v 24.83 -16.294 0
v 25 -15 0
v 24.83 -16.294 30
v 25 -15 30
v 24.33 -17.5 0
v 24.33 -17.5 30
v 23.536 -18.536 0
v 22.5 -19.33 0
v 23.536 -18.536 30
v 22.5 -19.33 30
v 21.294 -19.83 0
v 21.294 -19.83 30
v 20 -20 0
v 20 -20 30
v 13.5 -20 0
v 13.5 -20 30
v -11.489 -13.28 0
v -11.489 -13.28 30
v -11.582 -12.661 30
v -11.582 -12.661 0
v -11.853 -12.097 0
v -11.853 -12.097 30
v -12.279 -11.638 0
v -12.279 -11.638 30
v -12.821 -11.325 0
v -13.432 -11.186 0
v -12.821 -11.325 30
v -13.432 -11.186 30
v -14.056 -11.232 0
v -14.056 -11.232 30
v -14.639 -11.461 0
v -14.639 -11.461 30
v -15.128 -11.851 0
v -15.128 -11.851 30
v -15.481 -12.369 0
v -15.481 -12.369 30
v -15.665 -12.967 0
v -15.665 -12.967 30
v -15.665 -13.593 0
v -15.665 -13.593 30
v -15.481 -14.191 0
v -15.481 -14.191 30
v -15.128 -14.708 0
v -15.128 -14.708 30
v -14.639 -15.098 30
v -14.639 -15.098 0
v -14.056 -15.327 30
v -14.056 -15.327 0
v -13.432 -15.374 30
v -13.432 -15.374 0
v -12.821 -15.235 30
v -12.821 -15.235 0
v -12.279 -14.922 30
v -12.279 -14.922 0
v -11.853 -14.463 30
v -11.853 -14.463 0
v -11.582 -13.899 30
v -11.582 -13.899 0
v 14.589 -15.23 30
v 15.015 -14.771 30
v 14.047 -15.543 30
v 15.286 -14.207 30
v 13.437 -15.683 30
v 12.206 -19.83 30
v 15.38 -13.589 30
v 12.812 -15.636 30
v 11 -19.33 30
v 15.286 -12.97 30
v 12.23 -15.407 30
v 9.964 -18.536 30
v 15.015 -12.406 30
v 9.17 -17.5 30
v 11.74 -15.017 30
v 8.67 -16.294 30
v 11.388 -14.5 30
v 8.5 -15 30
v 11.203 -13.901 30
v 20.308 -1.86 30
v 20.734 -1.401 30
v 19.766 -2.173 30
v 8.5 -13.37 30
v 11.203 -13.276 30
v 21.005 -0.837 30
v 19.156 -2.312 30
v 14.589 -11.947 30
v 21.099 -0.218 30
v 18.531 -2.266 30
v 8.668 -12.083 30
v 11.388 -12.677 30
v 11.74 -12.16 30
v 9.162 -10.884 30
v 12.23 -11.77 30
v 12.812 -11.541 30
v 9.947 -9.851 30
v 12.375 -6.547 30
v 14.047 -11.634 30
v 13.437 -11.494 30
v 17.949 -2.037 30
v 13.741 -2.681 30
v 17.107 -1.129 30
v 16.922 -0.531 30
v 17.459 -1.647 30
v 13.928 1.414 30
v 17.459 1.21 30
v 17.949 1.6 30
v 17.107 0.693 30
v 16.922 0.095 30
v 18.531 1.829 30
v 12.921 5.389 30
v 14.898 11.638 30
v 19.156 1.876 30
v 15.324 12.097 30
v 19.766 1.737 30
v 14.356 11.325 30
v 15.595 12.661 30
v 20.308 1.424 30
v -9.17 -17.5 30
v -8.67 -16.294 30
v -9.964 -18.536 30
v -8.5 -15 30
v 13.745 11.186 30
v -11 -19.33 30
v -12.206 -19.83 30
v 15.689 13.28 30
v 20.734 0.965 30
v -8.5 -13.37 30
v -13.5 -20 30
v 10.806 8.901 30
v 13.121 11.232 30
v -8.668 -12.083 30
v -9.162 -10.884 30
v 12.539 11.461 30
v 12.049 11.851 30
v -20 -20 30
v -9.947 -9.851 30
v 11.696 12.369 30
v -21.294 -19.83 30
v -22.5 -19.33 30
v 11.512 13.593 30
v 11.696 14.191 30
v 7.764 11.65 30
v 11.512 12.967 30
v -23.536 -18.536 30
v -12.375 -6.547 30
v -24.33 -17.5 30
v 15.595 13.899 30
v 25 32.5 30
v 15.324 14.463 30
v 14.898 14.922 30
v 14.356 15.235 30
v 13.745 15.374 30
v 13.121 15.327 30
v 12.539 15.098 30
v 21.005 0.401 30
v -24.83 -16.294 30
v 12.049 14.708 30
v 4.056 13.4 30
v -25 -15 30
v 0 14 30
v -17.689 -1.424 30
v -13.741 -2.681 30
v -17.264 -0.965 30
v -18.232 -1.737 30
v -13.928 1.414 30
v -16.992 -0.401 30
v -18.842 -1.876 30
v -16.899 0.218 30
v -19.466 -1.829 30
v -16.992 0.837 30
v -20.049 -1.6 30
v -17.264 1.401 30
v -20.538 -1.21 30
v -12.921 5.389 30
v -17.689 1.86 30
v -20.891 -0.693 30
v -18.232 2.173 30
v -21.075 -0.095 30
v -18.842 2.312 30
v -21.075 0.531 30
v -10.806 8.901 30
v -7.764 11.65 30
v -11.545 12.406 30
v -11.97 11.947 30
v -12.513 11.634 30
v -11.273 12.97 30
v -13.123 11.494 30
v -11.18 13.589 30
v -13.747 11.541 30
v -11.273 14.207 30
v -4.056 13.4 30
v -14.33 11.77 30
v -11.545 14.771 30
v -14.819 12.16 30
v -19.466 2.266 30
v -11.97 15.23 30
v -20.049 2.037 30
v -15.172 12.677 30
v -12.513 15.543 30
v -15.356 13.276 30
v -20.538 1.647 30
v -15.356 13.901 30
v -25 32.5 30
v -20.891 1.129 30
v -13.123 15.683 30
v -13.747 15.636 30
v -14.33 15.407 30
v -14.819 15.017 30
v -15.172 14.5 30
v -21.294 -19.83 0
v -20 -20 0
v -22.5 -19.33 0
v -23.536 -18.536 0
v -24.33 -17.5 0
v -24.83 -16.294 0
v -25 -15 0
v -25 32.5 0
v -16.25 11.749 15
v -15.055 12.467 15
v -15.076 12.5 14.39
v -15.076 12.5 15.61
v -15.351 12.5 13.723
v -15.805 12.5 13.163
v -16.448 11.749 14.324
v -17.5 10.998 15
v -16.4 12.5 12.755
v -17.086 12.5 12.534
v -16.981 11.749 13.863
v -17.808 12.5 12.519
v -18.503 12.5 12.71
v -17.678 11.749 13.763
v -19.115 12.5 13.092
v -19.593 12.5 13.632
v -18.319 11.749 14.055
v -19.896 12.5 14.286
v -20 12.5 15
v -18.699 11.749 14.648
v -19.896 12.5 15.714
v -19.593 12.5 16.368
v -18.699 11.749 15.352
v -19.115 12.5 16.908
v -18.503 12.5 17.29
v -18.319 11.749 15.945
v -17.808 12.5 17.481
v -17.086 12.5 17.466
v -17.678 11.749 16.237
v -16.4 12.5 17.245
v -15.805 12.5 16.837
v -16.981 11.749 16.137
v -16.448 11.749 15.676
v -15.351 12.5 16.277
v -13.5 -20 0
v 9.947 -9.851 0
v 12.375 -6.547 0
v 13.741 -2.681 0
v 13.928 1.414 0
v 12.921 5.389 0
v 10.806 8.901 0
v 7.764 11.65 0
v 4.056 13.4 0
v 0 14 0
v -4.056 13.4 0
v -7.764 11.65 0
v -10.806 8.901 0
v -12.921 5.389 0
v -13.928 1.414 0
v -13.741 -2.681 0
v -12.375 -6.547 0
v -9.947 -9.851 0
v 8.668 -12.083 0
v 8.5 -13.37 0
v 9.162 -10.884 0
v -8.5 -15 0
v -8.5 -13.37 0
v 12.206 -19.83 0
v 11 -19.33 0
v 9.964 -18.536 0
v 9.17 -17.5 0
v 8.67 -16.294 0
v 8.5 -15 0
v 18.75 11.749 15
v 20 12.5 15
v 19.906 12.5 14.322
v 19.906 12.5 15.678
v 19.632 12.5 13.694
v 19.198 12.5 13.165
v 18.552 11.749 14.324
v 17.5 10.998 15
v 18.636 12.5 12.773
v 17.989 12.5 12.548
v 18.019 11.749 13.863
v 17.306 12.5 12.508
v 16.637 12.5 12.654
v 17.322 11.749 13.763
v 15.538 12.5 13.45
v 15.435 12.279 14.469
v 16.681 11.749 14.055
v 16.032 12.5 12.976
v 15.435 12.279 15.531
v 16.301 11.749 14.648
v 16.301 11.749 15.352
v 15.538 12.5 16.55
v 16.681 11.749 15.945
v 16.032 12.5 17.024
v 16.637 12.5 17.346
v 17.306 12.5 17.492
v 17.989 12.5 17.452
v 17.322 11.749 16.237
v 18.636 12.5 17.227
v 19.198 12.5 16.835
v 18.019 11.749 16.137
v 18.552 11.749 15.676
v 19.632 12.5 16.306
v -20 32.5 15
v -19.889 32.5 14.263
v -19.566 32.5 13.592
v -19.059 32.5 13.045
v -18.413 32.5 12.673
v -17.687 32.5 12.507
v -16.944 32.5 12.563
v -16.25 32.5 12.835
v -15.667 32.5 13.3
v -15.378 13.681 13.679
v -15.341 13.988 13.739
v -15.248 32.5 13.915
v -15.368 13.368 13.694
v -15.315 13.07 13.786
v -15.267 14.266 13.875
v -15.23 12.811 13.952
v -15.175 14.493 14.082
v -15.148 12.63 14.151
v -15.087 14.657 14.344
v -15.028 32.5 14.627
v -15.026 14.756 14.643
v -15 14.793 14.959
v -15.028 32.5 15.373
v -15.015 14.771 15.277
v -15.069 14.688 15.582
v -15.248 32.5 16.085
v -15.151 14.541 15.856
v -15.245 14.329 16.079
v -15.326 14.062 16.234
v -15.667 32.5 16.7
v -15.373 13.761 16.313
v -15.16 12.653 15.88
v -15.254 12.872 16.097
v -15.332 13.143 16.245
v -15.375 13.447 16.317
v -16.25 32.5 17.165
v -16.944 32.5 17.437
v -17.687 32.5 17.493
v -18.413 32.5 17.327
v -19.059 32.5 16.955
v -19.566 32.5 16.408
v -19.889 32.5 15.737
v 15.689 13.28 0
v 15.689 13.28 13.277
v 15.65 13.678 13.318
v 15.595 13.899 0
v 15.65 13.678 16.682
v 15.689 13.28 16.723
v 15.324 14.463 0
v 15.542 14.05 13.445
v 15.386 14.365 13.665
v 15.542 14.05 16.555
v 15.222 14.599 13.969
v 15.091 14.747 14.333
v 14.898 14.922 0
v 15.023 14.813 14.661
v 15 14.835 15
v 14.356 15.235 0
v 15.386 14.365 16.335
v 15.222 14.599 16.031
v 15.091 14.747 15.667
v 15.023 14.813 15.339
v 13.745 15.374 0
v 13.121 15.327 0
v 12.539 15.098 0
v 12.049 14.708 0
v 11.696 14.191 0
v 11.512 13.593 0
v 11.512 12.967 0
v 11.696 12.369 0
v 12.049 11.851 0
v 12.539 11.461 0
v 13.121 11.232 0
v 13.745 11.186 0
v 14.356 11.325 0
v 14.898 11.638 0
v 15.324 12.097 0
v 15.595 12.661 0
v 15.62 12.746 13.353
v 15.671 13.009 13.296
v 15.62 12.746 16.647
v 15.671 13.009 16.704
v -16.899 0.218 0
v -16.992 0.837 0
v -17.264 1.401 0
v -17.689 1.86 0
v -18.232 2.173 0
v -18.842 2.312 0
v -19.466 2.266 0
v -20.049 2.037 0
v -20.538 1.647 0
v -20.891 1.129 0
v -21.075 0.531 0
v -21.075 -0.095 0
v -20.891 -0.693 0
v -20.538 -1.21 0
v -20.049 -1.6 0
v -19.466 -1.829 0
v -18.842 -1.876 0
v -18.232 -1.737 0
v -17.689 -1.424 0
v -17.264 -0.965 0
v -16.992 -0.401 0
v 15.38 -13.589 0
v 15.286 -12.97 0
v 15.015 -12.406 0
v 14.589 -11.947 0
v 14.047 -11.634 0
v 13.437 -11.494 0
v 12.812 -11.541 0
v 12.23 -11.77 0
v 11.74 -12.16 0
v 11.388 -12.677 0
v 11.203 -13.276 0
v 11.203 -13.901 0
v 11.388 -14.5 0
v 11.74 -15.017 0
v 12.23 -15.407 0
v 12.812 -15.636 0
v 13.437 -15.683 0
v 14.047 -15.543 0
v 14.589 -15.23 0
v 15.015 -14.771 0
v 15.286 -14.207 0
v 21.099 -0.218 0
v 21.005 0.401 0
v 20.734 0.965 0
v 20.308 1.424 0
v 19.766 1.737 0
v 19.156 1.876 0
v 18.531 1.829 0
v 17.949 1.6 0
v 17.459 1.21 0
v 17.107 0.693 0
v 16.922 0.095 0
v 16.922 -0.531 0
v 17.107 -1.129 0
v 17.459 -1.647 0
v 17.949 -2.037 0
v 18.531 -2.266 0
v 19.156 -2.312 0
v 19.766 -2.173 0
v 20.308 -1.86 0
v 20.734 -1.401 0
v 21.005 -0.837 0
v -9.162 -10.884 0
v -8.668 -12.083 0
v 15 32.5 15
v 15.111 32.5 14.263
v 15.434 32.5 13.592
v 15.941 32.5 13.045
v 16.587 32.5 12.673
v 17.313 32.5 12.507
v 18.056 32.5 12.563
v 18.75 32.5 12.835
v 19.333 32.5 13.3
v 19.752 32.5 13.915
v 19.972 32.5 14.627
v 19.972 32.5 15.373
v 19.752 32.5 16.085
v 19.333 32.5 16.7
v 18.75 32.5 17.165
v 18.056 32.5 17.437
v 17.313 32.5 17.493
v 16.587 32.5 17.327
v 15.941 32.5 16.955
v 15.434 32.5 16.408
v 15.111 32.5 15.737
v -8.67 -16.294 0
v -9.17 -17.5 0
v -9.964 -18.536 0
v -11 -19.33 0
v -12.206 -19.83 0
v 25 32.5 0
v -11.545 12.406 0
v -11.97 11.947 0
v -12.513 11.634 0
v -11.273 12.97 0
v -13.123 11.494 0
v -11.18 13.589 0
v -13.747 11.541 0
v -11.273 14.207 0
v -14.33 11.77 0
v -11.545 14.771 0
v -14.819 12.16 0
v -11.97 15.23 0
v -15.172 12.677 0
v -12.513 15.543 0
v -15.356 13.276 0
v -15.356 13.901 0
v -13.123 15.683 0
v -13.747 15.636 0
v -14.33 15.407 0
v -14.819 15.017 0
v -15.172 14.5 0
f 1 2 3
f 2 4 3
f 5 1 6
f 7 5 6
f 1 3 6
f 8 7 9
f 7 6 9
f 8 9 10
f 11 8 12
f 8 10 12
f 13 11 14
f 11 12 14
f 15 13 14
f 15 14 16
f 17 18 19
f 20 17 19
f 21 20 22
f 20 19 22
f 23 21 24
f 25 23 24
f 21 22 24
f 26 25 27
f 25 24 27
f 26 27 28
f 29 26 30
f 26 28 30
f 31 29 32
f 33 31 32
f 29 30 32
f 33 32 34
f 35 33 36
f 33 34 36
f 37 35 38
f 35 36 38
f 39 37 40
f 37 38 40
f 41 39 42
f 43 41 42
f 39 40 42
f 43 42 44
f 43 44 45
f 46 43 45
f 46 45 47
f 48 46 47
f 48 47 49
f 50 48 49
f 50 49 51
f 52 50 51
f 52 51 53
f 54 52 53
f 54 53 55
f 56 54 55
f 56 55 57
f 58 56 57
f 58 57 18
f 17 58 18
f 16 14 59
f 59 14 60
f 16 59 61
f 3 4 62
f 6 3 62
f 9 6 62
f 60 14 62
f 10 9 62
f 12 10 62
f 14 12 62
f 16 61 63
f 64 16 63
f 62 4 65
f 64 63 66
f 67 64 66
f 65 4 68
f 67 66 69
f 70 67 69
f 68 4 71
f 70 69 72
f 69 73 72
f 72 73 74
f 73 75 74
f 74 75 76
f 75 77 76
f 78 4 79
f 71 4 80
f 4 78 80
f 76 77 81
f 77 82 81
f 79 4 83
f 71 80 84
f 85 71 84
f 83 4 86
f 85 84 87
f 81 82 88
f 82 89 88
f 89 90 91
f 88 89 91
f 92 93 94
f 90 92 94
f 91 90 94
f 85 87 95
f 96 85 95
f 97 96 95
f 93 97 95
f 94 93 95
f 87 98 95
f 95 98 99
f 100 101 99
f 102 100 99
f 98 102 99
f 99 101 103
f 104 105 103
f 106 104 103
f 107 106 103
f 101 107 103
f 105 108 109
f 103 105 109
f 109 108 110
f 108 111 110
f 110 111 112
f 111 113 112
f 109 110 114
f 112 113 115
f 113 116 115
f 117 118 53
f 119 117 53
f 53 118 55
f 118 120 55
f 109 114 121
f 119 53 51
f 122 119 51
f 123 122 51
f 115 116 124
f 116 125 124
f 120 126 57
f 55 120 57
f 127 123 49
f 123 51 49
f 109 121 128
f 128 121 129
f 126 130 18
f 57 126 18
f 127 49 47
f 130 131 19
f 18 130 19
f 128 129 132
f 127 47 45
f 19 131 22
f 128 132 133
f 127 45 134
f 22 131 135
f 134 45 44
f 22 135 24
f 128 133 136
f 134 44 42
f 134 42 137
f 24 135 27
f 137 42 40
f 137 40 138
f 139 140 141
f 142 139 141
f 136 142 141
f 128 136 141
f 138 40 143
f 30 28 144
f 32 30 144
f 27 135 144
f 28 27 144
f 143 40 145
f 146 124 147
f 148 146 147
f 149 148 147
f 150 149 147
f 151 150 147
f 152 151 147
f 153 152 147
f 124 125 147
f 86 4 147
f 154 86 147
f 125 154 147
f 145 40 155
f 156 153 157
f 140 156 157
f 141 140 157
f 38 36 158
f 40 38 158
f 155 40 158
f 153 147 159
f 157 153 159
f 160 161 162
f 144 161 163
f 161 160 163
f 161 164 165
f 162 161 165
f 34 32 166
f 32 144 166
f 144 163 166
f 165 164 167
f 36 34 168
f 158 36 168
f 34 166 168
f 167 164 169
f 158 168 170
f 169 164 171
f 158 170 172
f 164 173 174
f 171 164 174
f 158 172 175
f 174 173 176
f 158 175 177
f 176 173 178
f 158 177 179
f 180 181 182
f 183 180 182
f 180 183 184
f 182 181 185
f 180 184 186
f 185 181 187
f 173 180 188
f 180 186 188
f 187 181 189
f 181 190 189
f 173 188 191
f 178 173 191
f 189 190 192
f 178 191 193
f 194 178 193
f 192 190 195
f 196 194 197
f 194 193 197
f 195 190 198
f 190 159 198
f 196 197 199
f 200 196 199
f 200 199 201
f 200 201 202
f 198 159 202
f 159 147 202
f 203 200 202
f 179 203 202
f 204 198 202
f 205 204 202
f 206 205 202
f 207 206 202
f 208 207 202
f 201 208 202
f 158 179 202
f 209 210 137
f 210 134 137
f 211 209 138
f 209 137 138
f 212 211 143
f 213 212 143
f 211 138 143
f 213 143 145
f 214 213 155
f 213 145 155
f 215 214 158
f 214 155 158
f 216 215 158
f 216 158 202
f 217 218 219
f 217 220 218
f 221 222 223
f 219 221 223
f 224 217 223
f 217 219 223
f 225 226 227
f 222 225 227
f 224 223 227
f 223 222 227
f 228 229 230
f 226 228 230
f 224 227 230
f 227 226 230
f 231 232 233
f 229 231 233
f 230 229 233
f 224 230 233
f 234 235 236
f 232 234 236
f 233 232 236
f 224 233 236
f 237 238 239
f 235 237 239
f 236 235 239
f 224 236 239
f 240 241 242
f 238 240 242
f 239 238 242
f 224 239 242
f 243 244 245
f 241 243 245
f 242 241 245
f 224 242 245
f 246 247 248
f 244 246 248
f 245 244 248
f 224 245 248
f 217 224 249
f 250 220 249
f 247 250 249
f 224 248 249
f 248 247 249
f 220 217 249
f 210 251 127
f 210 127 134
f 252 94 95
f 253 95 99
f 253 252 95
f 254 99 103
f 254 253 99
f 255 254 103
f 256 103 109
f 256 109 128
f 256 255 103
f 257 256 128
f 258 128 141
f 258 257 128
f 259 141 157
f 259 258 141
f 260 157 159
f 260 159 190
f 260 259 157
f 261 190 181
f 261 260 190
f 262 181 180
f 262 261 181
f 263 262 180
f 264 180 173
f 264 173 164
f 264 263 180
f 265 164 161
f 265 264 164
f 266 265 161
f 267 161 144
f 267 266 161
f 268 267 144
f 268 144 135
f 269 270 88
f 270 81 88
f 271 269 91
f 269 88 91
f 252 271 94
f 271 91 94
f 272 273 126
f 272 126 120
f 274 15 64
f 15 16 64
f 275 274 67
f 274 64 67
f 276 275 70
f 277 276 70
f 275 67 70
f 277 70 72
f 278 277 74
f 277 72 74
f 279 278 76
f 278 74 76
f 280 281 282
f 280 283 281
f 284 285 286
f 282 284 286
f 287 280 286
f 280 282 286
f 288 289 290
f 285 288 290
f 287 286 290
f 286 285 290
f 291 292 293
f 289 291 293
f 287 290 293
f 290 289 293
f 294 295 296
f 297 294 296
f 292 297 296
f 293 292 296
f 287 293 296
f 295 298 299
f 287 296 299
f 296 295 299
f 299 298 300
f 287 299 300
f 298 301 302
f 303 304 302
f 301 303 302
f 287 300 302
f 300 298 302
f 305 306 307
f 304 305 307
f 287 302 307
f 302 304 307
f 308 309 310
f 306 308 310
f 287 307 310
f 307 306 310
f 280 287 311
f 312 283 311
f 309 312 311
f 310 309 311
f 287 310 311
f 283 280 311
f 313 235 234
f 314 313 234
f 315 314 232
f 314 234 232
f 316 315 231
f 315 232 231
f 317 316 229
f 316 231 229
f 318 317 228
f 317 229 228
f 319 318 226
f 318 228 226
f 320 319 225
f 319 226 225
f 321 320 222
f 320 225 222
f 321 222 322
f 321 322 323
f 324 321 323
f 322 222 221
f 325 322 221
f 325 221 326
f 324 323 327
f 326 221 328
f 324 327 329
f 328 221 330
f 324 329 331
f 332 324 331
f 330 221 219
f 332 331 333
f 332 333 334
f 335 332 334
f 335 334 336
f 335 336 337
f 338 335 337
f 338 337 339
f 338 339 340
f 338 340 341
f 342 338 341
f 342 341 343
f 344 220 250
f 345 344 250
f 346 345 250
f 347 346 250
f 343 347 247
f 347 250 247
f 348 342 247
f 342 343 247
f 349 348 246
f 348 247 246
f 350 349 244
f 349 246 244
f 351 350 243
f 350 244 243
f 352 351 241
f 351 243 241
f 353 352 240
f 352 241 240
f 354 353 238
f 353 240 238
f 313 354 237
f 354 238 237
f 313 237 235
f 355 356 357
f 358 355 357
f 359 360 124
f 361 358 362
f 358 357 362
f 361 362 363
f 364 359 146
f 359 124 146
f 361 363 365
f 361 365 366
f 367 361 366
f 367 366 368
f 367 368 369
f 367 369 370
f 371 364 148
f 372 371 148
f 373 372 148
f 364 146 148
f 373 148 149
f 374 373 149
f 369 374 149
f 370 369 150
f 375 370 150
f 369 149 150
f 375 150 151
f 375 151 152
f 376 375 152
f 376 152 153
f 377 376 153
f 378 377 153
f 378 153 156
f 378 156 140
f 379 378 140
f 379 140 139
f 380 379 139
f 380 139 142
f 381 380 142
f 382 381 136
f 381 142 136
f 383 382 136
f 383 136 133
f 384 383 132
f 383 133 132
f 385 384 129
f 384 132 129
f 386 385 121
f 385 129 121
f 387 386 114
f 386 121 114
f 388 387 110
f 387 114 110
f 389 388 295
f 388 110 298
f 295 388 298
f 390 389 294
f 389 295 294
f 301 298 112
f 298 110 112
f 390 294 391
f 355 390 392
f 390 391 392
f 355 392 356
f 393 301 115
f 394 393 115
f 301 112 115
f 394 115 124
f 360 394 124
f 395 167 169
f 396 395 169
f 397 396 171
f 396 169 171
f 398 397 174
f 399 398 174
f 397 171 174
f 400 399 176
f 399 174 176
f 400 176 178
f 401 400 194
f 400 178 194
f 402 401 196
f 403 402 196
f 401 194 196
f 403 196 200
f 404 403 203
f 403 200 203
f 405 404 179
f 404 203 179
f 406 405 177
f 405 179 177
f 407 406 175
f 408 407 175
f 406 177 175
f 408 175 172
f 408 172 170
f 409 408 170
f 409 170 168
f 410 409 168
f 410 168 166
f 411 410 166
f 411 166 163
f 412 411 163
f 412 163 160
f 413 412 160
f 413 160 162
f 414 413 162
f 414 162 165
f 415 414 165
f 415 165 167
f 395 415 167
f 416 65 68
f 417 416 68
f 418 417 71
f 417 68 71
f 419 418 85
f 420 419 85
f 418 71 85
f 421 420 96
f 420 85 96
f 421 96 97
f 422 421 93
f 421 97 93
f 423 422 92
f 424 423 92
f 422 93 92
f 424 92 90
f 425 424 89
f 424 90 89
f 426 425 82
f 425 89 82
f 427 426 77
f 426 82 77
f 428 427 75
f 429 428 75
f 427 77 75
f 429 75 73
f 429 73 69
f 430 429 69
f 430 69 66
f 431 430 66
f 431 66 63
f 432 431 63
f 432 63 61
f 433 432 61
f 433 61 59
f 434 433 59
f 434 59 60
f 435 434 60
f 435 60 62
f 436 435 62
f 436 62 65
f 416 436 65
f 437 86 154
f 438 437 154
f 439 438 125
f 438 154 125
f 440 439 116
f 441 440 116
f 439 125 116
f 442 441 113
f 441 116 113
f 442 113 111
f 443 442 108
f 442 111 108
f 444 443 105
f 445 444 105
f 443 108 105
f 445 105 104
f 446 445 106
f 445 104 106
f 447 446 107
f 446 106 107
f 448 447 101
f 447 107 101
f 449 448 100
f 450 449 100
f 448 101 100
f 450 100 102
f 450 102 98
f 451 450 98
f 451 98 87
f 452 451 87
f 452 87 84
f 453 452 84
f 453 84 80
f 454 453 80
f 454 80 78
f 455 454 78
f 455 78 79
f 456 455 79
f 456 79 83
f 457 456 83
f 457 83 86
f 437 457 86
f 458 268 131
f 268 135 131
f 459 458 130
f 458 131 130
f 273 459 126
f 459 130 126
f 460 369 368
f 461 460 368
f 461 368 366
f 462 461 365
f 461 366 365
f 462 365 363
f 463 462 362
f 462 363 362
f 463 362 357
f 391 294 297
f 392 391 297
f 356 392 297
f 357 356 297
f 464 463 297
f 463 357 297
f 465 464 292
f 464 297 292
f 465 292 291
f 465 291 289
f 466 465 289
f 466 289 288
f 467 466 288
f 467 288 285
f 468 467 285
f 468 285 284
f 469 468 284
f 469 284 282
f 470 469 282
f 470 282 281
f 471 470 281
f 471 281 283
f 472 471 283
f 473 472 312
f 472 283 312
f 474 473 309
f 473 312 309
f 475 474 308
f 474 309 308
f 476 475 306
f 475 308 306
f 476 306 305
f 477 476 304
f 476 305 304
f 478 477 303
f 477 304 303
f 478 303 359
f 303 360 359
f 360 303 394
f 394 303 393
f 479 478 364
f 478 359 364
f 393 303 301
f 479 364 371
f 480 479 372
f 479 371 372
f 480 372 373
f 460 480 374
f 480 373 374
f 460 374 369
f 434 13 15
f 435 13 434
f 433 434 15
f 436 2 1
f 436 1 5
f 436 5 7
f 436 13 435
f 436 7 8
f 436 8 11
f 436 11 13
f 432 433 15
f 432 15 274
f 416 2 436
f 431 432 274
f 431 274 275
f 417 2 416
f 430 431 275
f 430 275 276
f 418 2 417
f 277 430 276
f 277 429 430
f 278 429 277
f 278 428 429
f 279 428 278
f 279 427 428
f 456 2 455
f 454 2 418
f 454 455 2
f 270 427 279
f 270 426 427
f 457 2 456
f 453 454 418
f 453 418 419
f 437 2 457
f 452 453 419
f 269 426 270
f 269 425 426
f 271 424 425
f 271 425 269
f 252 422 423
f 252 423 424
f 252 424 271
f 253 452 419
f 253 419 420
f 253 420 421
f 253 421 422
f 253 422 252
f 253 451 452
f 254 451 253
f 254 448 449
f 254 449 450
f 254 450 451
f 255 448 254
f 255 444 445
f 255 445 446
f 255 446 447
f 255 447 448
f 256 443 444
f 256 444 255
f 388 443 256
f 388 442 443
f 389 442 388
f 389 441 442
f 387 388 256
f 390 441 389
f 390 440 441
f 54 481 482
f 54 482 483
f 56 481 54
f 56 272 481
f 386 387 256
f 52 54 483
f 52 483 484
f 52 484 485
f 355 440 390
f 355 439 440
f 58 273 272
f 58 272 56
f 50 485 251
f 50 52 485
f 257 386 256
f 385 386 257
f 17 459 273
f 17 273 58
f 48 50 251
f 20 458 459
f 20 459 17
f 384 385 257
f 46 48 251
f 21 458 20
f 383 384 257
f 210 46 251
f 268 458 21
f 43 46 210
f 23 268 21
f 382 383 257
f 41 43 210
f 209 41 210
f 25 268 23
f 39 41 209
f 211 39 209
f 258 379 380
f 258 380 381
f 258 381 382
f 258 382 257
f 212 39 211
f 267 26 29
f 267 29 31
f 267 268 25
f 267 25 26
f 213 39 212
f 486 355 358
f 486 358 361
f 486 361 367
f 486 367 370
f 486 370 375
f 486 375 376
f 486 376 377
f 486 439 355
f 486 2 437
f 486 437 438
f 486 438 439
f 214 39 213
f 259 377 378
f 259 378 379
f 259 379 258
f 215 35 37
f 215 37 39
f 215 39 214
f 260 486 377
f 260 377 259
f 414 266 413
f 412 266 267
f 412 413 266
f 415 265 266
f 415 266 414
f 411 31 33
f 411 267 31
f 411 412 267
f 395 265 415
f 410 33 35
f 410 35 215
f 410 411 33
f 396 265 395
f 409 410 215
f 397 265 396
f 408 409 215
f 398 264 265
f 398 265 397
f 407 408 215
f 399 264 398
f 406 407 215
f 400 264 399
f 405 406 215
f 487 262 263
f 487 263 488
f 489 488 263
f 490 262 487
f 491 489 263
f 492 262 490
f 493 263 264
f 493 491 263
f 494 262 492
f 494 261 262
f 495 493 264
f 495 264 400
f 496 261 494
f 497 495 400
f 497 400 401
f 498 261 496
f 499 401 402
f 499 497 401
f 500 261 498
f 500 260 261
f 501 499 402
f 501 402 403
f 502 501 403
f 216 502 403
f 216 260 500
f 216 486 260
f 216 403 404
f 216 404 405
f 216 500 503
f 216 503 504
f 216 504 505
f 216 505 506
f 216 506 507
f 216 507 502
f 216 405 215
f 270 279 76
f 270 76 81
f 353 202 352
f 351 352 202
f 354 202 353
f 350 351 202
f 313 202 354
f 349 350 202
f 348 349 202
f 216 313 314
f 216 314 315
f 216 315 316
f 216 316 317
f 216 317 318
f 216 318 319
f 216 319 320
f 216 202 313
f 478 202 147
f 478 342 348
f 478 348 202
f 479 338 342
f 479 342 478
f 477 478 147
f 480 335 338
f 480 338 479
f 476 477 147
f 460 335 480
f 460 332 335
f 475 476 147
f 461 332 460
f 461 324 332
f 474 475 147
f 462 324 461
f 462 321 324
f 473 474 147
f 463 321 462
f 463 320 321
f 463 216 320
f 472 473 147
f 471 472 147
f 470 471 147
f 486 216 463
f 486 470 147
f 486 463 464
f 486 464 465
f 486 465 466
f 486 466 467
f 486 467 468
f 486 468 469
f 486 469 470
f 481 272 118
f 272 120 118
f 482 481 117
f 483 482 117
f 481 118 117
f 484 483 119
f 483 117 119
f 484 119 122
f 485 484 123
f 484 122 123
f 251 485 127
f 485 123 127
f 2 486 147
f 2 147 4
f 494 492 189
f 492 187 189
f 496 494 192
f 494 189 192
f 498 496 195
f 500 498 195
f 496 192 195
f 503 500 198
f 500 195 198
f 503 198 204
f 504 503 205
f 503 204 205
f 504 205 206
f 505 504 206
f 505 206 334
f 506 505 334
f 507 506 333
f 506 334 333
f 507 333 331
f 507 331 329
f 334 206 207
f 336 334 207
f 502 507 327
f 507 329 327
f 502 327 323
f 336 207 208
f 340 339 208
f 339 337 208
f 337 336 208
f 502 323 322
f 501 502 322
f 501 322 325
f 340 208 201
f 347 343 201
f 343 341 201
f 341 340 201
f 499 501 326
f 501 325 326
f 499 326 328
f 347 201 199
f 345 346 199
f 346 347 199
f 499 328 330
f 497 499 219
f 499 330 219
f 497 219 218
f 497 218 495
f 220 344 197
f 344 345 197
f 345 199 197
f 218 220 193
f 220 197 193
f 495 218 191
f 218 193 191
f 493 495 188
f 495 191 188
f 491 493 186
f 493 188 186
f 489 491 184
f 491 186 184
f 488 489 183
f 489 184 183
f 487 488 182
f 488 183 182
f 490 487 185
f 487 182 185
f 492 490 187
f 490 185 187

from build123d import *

# Parameters (mm, degrees)
EXTRUDE1_DEPTH        = 30
FILLET1_R             = 5
M5_TAPPED_HOLE1_D     = 4.2
M6_TAPPED_HOLE1_D     = 5
M6_TAPPED_HOLE1_DEPTH = 20
M6_TAPPED_HOLE1_TIP   = 1.502151548


with BuildPart() as part:
    # Sketch1 → Extrude1 (new body)
    with BuildSketch(Plane.XY):
        with BuildLine():
            Line((-25, 32.5), (25, 32.5))
            Line((25, 32.5), (25, -20))
            Line((25, -20), (8.5, -20))
            Line((8.5, -20), (8.5, -11.124297731))
            ThreePointArc((8.5, -11.124297731), (0, 14), (-8.5, -11.124297731))
            Line((-8.5, -11.124297731), (-8.5, -20))
            Line((-8.5, -20), (-25, -20))
            Line((-25, -20), (-25, 32.5))
        make_face()
    extrude(amount=EXTRUDE1_DEPTH)

    # Fillet1
    fillet1_edges = [part.edges().sort_by_distance(p)[0] for p in [
        (-8.5, -20, 15),
        (-25, -20, 15),
        (25, -20, 15),
        (8.5, -20, 15),
        (8.5, -11.124297731, 15),
        (-8.5, -11.124297731, 15),
    ]]
    fillet(fillet1_edges, radius=FILLET1_R)

    # M5 Tapped Hole1 (through all)
    with Locations(Plane(origin=(0, 0, 0), x_dir=(-1, 0, 0), z_dir=(0, 0, -1))):
        with Locations((-13.588507986, 13.279776004), (13.279776004, 13.588507986), (18.998745808, 0.218306478), (13.588507986, -13.279776004), (-13.279776004, -13.588507986), (-18.998745808, -0.218306478)):
            Hole(M5_TAPPED_HOLE1_D / 2)

    # M6 Tapped Hole1
    with Locations(Plane(origin=(0, 32.5, 0), x_dir=(1, 0, 0), z_dir=(0, 1, 0))):
        with Locations((-17.5, -15), (17.5, -15)):
            Hole(M6_TAPPED_HOLE1_D / 2, depth=M6_TAPPED_HOLE1_DEPTH)
            with Locations((0, 0, -(M6_TAPPED_HOLE1_DEPTH + M6_TAPPED_HOLE1_TIP / 2))):  # 118° drill point
                Cone(0, M6_TAPPED_HOLE1_D / 2, M6_TAPPED_HOLE1_TIP, mode=Mode.SUBTRACT)


solid = part.part
